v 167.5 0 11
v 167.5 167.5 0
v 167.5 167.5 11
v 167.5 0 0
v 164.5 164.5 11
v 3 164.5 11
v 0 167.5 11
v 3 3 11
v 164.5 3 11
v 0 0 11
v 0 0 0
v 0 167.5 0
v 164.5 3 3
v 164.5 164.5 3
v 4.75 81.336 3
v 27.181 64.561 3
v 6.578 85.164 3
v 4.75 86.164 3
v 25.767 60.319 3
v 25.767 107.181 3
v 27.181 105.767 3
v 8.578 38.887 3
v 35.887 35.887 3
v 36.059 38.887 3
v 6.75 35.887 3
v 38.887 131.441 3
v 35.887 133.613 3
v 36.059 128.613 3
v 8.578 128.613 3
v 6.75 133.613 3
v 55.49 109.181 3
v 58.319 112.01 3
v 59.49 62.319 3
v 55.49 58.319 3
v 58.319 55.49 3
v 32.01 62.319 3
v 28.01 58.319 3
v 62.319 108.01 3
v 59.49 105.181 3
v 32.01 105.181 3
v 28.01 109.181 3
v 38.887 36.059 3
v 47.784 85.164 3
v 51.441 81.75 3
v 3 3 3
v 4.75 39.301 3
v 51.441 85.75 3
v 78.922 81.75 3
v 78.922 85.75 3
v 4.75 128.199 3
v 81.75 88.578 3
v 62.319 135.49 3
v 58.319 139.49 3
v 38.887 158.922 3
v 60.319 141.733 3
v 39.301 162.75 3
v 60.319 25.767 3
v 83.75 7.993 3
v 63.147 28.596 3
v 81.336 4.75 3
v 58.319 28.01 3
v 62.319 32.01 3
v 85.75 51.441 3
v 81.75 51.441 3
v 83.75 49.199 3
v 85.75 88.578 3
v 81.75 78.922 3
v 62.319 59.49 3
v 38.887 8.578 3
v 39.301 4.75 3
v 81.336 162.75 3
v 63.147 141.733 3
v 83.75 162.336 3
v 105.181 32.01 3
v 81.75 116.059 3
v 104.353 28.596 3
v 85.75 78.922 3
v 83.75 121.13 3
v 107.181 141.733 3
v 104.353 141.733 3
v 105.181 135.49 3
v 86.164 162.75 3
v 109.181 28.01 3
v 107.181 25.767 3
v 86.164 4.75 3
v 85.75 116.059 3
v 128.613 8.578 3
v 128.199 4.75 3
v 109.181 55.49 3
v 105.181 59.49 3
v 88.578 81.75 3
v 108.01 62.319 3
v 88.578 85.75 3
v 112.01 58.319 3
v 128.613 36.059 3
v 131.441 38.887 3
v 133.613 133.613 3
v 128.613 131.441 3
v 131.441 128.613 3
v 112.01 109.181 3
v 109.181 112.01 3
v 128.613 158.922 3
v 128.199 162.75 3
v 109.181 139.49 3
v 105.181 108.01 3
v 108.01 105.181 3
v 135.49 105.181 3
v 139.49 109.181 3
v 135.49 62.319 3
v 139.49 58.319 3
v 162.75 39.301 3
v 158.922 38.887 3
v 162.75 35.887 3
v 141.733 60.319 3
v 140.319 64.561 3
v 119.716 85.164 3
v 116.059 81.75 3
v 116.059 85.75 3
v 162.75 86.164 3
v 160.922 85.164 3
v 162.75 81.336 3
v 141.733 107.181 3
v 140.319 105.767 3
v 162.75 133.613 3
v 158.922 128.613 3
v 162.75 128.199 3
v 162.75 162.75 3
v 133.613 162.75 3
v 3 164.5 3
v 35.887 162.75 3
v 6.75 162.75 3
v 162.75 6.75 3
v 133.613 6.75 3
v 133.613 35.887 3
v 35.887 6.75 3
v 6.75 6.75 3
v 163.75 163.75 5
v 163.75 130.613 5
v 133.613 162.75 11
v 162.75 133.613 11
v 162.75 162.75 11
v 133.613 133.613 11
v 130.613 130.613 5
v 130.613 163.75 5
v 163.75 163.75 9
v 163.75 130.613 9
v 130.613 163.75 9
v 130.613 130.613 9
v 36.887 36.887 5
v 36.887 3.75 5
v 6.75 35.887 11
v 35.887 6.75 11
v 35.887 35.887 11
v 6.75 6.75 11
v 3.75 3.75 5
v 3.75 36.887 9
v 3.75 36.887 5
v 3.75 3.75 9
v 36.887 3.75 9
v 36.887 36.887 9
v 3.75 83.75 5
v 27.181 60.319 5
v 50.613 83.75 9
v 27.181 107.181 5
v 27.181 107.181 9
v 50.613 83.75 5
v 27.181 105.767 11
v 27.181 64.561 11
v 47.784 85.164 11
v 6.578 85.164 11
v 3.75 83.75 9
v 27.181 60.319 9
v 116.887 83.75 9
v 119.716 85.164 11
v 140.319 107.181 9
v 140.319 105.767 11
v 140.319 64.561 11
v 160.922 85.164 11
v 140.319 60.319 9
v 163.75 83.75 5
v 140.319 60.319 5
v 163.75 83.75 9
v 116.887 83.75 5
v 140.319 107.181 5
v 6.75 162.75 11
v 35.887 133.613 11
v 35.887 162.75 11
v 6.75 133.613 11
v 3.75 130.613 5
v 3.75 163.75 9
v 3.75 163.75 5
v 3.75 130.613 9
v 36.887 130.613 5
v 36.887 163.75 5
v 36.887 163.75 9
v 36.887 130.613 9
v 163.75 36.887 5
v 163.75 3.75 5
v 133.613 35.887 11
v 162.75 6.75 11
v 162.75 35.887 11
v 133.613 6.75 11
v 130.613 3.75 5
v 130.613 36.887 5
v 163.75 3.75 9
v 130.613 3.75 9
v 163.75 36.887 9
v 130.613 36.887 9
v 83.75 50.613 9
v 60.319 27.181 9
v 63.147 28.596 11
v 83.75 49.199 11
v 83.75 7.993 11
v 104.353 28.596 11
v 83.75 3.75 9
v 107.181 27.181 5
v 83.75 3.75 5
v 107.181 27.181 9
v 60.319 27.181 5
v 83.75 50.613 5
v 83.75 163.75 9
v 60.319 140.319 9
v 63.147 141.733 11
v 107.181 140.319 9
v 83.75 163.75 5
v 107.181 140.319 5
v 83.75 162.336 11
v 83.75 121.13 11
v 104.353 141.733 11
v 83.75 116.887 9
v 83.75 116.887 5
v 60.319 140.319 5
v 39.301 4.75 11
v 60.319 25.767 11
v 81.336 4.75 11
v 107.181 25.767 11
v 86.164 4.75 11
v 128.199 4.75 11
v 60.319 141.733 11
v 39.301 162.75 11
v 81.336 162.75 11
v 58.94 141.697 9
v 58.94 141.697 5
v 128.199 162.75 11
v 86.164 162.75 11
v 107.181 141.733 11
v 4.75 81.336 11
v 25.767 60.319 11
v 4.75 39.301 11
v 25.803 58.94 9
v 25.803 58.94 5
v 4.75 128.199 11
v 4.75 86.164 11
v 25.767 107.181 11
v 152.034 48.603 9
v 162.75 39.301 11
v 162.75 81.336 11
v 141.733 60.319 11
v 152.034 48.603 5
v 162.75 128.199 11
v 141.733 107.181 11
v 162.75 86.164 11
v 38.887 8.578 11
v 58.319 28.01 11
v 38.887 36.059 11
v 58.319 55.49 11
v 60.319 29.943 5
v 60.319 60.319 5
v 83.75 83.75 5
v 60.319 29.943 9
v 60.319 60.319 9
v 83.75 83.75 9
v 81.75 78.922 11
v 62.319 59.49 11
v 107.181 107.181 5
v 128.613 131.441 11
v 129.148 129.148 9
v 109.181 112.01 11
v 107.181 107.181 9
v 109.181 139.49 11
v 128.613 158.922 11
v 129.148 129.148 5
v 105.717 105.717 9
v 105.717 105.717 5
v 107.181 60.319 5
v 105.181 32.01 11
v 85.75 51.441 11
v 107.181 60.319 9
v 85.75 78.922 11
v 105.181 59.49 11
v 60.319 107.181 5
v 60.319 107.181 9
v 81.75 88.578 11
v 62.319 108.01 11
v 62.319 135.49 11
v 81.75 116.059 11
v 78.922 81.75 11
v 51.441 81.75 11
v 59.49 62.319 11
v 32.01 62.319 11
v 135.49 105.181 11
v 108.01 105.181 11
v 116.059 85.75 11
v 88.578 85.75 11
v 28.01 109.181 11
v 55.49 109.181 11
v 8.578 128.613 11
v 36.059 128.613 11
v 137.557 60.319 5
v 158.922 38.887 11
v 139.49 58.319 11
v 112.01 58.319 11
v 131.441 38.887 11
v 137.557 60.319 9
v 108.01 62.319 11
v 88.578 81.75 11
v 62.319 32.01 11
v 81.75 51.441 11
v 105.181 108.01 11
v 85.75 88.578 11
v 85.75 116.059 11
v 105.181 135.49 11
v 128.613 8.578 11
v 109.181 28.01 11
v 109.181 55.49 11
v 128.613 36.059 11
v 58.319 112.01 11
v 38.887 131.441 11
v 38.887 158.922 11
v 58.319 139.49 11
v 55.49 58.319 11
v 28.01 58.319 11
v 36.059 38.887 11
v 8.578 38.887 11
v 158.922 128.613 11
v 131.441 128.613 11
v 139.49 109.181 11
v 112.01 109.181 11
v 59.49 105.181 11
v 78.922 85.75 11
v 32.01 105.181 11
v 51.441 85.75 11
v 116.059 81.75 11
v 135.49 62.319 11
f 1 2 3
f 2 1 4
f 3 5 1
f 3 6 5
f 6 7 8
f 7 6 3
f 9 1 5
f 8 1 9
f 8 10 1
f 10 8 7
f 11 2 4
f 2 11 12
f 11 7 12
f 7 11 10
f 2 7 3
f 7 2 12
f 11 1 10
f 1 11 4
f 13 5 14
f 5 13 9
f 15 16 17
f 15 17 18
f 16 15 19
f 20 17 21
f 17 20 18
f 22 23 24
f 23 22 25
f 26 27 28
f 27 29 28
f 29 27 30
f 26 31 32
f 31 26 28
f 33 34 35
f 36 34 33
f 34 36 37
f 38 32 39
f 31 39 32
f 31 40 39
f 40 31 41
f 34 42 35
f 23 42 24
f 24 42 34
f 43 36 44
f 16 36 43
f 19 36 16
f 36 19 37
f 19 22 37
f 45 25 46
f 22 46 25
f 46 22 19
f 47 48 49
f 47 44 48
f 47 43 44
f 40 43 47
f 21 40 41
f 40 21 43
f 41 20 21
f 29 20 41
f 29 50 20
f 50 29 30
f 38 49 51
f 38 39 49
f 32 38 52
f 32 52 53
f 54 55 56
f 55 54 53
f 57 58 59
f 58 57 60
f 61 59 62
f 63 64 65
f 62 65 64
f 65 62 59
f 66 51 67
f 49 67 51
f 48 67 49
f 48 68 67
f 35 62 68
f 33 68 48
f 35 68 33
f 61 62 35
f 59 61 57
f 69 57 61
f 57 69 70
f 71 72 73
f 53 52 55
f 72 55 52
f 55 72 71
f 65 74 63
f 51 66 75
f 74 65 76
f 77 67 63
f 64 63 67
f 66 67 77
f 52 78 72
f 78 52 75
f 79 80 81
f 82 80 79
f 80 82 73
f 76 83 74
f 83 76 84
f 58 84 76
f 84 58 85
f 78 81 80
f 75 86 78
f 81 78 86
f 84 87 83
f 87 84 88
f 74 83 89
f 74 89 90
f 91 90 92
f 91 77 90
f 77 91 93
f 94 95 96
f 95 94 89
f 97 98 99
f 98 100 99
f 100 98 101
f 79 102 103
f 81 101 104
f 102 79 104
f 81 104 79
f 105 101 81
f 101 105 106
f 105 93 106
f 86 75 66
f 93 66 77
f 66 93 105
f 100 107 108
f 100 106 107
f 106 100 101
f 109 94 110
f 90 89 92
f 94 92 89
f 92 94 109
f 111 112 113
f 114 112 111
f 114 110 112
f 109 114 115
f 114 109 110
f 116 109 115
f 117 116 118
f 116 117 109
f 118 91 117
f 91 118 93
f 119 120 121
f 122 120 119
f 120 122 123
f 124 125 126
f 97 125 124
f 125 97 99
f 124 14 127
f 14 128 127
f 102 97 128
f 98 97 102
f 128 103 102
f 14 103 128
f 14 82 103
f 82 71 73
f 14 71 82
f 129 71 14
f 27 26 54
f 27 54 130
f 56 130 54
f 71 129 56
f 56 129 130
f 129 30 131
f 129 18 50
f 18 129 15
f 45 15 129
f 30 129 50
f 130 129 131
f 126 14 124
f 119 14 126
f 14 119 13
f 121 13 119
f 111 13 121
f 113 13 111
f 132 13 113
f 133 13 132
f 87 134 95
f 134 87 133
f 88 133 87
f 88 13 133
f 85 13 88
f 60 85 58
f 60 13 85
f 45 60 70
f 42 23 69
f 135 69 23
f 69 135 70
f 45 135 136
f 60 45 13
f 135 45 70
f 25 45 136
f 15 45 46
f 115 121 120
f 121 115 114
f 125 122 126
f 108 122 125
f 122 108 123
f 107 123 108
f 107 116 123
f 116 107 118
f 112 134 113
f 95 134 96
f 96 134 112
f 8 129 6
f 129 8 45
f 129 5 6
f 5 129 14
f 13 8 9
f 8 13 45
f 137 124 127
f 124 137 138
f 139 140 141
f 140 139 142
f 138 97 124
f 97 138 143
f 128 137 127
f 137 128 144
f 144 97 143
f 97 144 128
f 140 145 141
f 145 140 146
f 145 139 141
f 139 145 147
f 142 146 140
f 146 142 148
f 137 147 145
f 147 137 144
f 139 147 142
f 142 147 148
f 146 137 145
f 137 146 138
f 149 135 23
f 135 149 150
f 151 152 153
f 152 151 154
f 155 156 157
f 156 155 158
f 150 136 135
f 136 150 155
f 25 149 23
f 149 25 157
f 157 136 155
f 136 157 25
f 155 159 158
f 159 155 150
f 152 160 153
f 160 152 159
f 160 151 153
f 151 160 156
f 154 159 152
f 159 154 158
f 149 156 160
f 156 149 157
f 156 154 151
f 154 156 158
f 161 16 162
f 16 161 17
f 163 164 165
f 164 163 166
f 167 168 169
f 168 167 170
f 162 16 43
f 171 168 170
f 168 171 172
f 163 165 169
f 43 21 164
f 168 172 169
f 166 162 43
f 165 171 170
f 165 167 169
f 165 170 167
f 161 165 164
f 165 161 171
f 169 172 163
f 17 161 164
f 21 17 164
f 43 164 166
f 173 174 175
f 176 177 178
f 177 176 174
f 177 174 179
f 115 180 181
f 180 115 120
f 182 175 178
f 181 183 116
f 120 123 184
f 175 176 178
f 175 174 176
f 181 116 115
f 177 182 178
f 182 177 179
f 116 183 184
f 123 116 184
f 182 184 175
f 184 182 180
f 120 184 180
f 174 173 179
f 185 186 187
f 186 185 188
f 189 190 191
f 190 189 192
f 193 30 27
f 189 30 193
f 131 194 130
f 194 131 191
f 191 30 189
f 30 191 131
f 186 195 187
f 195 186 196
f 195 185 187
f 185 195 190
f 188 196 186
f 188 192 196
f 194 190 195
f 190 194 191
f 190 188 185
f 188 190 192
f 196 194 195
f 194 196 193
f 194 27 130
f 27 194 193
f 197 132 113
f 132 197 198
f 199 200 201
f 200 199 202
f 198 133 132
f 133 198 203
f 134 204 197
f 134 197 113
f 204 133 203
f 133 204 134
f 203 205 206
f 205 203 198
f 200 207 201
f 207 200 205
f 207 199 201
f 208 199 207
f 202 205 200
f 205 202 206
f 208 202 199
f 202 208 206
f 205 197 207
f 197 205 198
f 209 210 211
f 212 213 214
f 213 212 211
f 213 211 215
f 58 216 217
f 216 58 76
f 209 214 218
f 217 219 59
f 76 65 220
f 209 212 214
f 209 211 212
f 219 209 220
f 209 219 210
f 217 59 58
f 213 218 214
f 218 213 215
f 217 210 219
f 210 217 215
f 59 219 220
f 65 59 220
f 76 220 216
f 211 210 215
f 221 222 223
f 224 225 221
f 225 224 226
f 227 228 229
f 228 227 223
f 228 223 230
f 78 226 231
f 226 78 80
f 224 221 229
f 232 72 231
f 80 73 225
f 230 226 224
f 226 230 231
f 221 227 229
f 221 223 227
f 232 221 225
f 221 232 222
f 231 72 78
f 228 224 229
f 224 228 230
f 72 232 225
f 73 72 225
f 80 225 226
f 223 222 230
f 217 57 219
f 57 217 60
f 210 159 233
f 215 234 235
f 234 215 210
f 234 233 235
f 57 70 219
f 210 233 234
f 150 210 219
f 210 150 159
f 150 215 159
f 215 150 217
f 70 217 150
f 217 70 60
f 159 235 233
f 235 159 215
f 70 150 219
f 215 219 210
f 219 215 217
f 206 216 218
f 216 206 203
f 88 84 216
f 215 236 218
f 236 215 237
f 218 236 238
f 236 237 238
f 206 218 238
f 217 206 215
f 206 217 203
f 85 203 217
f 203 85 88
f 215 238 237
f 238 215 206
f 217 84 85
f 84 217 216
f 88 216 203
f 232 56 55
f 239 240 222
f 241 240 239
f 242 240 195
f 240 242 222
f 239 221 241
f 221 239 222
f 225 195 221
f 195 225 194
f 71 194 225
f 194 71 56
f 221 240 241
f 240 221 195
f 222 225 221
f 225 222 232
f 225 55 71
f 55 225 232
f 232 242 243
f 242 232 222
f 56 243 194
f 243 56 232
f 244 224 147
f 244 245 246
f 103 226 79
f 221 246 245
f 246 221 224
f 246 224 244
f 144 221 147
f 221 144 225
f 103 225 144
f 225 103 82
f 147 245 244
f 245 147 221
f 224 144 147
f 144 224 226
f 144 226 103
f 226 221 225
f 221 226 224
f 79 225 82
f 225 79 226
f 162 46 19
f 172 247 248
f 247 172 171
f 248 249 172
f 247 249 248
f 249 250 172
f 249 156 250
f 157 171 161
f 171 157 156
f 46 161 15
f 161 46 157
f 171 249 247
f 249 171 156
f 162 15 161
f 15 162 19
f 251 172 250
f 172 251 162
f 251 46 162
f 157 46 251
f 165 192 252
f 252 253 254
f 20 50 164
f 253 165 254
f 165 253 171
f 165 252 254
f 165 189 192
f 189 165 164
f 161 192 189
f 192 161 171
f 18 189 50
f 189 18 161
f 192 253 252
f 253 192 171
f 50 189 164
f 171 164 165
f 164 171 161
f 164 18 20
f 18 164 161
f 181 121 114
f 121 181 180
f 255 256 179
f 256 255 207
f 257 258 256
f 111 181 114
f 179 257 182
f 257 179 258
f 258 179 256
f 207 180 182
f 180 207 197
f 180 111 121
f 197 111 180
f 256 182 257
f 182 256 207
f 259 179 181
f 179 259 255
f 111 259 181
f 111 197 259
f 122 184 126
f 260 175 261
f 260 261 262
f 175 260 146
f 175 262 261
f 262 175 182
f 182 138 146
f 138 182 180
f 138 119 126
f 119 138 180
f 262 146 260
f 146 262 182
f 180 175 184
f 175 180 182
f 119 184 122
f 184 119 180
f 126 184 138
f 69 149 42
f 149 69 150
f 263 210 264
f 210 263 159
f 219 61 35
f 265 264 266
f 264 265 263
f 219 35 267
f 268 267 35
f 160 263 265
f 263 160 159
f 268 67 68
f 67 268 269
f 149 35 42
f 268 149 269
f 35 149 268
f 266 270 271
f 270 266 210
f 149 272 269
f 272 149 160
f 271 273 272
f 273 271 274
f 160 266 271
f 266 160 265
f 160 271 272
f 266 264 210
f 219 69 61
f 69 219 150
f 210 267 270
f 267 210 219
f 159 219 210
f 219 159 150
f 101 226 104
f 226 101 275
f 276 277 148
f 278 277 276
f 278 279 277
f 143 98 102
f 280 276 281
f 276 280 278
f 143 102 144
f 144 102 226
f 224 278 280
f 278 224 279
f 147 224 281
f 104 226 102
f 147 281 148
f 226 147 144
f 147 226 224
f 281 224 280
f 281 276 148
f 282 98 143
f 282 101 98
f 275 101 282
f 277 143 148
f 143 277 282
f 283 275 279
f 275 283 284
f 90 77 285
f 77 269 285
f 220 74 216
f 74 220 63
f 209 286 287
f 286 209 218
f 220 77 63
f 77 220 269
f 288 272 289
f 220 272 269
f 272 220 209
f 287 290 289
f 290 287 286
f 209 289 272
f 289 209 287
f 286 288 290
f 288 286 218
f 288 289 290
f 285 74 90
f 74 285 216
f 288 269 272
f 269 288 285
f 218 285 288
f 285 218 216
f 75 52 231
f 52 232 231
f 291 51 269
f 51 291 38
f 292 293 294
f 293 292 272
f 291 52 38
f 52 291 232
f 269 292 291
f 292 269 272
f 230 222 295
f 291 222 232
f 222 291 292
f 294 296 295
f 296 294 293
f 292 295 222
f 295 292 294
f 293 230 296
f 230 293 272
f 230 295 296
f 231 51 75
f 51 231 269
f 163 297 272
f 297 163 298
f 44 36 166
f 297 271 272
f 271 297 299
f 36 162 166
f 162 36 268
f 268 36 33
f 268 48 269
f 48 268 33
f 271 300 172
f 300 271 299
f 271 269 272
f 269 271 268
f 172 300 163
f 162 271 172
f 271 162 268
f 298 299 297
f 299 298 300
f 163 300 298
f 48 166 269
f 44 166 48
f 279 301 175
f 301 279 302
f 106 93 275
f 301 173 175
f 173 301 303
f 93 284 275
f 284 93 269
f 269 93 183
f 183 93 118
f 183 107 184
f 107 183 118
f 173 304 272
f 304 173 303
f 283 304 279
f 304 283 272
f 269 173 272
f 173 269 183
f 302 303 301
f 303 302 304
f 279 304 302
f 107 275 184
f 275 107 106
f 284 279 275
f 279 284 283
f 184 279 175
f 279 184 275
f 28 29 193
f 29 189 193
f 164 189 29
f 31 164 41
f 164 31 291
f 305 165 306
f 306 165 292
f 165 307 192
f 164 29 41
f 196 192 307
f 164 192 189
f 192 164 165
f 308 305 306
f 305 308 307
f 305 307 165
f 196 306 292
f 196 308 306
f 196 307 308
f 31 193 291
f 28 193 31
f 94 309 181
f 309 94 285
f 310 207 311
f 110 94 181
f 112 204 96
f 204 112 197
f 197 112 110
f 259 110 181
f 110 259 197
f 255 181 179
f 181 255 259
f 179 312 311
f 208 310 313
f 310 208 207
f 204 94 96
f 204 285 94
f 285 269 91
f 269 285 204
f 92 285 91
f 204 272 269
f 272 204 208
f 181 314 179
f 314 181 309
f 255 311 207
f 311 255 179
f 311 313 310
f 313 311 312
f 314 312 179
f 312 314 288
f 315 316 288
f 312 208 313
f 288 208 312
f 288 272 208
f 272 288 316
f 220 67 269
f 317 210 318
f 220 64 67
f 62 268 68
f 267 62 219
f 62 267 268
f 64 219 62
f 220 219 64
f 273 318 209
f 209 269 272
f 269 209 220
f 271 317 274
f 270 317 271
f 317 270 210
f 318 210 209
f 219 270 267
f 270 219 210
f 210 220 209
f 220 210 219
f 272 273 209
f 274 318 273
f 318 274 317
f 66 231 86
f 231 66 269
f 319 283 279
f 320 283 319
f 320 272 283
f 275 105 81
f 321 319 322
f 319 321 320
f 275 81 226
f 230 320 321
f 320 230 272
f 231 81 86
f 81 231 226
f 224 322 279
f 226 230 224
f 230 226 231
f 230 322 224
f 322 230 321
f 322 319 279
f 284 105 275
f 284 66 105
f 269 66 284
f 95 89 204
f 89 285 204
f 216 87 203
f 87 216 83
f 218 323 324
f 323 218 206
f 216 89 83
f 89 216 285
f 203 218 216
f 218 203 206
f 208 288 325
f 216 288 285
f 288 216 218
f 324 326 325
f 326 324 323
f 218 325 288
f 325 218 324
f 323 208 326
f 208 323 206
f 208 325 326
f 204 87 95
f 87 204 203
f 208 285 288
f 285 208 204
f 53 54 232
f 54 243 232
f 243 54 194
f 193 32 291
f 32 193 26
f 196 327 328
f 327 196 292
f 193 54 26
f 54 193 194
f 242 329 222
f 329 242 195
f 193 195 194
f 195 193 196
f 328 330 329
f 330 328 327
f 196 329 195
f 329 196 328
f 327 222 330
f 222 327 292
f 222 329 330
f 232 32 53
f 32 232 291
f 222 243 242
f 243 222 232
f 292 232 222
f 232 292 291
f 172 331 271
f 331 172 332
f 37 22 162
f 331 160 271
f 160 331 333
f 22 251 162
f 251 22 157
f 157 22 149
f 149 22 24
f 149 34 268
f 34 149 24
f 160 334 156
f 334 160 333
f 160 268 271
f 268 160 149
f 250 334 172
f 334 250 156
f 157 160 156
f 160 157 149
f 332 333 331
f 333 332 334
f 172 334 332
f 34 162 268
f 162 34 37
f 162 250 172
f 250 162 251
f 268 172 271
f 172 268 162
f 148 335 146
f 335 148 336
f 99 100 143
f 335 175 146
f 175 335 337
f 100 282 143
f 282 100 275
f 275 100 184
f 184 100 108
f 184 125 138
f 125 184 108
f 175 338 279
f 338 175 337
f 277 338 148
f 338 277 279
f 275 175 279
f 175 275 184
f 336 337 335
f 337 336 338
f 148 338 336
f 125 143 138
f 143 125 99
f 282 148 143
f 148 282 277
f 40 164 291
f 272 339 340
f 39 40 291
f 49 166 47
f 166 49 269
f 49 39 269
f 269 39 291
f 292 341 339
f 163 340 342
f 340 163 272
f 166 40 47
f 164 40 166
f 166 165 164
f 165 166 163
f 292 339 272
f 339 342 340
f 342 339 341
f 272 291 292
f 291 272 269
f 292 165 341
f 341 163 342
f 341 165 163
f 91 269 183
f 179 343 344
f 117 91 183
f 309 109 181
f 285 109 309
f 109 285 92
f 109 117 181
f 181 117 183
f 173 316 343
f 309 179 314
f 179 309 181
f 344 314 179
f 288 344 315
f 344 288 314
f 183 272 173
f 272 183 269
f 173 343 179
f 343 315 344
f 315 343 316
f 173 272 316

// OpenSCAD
$vpt = [ 63.22, 24.48, 40.99 ];
$vpr = [ 54.30, 0.00, 340.90 ];
$vpd = 391.08;
$vpf = 22.50;

BASE_WIDTH = 160;
piece_HEIGHT = 4;
WALL_WIDTH = 3;
CHAMFER = 2;
BASE_SLOP = 1.5;

render_helper = 1;

piece_total_height = piece_HEIGHT + CHAMFER * 2;
base_total_width = WALL_WIDTH * 2 + BASE_WIDTH + BASE_SLOP;
base_total_height = WALL_WIDTH + piece_total_height;

half_base = BASE_WIDTH / 2;
long_side = half_base * (sqrt(2) - 1);
square_hyp = sqrt(2 * long_side ^ 2);
half_square_hyp = square_hyp / 2;
half_chamfer = CHAMFER / 2;
top_chamfer_offset = CHAMFER + piece_HEIGHT;

function getColor(colors, index) = len(colors) > index ? colors[index] : colors[0];

module base() {
    difference() {
        cube([
            base_total_width,
            base_total_width,
            base_total_height
        ]);
        
        translate([
            WALL_WIDTH,
            WALL_WIDTH,
            WALL_WIDTH
        ])
        cube([
            BASE_WIDTH + BASE_SLOP,
            BASE_WIDTH + BASE_SLOP,
            piece_total_height + render_helper
        ]);
    }
}

module piece_square() {
    module square2(side = long_side, h = piece_HEIGHT, delta = 0) {    
        linear_extrude(h)
        offset(delta = -delta)
        square(side);
    }
    
    hull() {
        translate([half_chamfer, half_chamfer, 0])
        square2(h = CHAMFER, delta = CHAMFER);
        
        translate([0, 0, CHAMFER])
        square2();
        
        translate([half_chamfer, half_chamfer, top_chamfer_offset])
        square2(h = CHAMFER, delta = CHAMFER);
    }
}

module piece_triangle() {
    module triangle(side = long_side, h = piece_HEIGHT, delta = 0) {
        linear_extrude(h)
        offset(delta = -delta)
        polygon([
            [0, 0],
            [0, side],
            [side, 0]
        ]);
    }
    
    hull() {
        triangle(h = CHAMFER, delta = half_chamfer);
        
        translate([0, 0, CHAMFER])
        triangle();

        translate([0, 0, top_chamfer_offset])
        triangle(h = CHAMFER, delta = half_chamfer);
    }
}

module piece_rhombus() {
    module rhombus(side = long_side,  h = piece_HEIGHT, delta = 0) {
        hyp = sqrt(2 * long_side ^ 2);
        half_hyp = hyp / 2;
        
        bottom_length = side;
        shape_height = half_hyp;

        linear_extrude(h)
        offset(delta = -delta)
        polygon([
            [0, 0],
            [side, 0],
            [side + shape_height, shape_height],
            [shape_height, shape_height]
        ]);
    }

    hull() {
        rhombus(h = CHAMFER, delta = CHAMFER);
        
        translate([0, 0, CHAMFER])
        rhombus();
        
        translate([0, 0, piece_HEIGHT + CHAMFER])
        rhombus(h = CHAMFER, delta = CHAMFER);
    }
}

module sample_pattern_one() {
    module sample_pattern_one_rhombi(colors = ["pink", "purple"]) {
        rhombus_height = long_side + half_square_hyp;
        rhombus_top = BASE_WIDTH - rhombus_height;
         
        color(getColor(colors, 0)) {
            translate([long_side, 0, 0])
            rotate([0, 0, 45])
            piece_rhombus();
            
            translate([long_side + square_hyp + half_square_hyp, rhombus_top, 0])
            rotate([0, 0, 45])
            piece_rhombus();
            
            translate([long_side + square_hyp + half_square_hyp, half_square_hyp, 0])
            rotate([0, 0, 90])
            piece_rhombus();
          
            translate([long_side + square_hyp, rhombus_top - half_square_hyp, 0])
            rotate([0, 0, 90])
            piece_rhombus();
            
            translate([rhombus_height + half_square_hyp, rhombus_height + half_square_hyp, 0])
            rotate([0, 0, 180])
            piece_rhombus();

            translate([rhombus_height * 2 + half_square_hyp, rhombus_height + square_hyp, 0])
            rotate([0, 0, 180])
            piece_rhombus();
            
            translate([rhombus_height, rhombus_top, 0])
            rotate([0, 0, 135])
            piece_rhombus();
            
            translate([BASE_WIDTH, long_side, 0])
            rotate([0, 0, 135])
            piece_rhombus();
        }
        color(getColor(colors, 1)) {
            translate([long_side + half_square_hyp, half_square_hyp, 0])
            rotate([0, 0, 45])
            piece_rhombus();
            
            translate([long_side + square_hyp, long_side + square_hyp, 0])
            rotate([0, 0, 45])
            piece_rhombus();
            
            translate([long_side + square_hyp * 2, 0, 0])
            rotate([0, 0, 90])
            piece_rhombus();
            
            translate([long_side + half_square_hyp, rhombus_top, 0])
            rotate([0, 0, 90])
            piece_rhombus();
            
            translate([rhombus_height, rhombus_height, 0])
            rotate([0, 0, 180])
            piece_rhombus();
            
            translate([BASE_WIDTH, BASE_WIDTH - long_side, 0])
            rotate([0, 0, 180])
            piece_rhombus();
            
            translate([rhombus_height + half_square_hyp, rhombus_top - half_square_hyp, 0])
            rotate([0, 0, 135])
            piece_rhombus();
            
            translate([rhombus_height * 2 + half_square_hyp, rhombus_top - square_hyp, 0])
            rotate([0, 0, 135])
            piece_rhombus();
        }
    }

    module sample_pattern_one_triangles(colors = ["darkgreen"]) {
        color(getColor(colors, 0)) {
            translate([long_side + half_square_hyp, half_square_hyp, 0])
            rotate([0, 0, -135])
            piece_triangle();
            
            translate([long_side + half_square_hyp + square_hyp, half_square_hyp, 0])
            rotate([0, 0, -135])
            piece_triangle();
            
            translate([long_side + half_square_hyp, BASE_WIDTH - half_square_hyp, 0])
            rotate([0, 0, 45])
            piece_triangle();
            
            translate([long_side + half_square_hyp + square_hyp, BASE_WIDTH - half_square_hyp, 0])
            rotate([0, 0, 45])
            piece_triangle();
            
            translate([half_square_hyp, long_side + half_square_hyp, 0])
            rotate([0, 0, 135])
            piece_triangle();
            
            translate([half_square_hyp, long_side + half_square_hyp + square_hyp, 0])
            rotate([0, 0, 135])
            piece_triangle();
            
            translate([BASE_WIDTH - half_square_hyp, long_side + half_square_hyp, 0])
            rotate([0, 0, -45])
            piece_triangle();
            
            translate([BASE_WIDTH - half_square_hyp, long_side + half_square_hyp + square_hyp, 0])
            rotate([0, 0, -45])
            piece_triangle();
        }
     }
     
    module sample_pattern_one_squares(colors = ["yellow", "seagreen"]) {
        square_offset = long_side + square_hyp * 2;
        
        color(getColor(colors, 0)) {
            translate([square_offset, square_offset, 0])
            piece_square();
            
            piece_square();
            
            translate([half_square_hyp, half_base - half_square_hyp, 0])
            rotate([0, 0, 45])
            piece_square();
            
            translate([BASE_WIDTH - half_square_hyp, half_base - half_square_hyp, 0])
            rotate([0, 0, 45])
            piece_square();
        }
        
        color(getColor(colors, 1)) {
            translate([0, square_offset, 0])
            piece_square();
            
            translate([square_offset, 0, 0])
            piece_square();
            
            translate([half_base, 0, 0])
            rotate([0, 0, 45])
            piece_square();
            
            translate([half_base, BASE_WIDTH - square_hyp, 0])
            rotate([0, 0, 45])
            piece_square();
        }
     }

    sample_pattern_one_squares();
    sample_pattern_one_triangles();
    sample_pattern_one_rhombi();
}

module barnsquare(colors = ["brown"]) {
    color(getColor(colors, 0))
    base();
    
    translate([WALL_WIDTH + BASE_SLOP / 2, WALL_WIDTH + BASE_SLOP / 2, WALL_WIDTH])
    sample_pattern_one();
}

barnsquare();
